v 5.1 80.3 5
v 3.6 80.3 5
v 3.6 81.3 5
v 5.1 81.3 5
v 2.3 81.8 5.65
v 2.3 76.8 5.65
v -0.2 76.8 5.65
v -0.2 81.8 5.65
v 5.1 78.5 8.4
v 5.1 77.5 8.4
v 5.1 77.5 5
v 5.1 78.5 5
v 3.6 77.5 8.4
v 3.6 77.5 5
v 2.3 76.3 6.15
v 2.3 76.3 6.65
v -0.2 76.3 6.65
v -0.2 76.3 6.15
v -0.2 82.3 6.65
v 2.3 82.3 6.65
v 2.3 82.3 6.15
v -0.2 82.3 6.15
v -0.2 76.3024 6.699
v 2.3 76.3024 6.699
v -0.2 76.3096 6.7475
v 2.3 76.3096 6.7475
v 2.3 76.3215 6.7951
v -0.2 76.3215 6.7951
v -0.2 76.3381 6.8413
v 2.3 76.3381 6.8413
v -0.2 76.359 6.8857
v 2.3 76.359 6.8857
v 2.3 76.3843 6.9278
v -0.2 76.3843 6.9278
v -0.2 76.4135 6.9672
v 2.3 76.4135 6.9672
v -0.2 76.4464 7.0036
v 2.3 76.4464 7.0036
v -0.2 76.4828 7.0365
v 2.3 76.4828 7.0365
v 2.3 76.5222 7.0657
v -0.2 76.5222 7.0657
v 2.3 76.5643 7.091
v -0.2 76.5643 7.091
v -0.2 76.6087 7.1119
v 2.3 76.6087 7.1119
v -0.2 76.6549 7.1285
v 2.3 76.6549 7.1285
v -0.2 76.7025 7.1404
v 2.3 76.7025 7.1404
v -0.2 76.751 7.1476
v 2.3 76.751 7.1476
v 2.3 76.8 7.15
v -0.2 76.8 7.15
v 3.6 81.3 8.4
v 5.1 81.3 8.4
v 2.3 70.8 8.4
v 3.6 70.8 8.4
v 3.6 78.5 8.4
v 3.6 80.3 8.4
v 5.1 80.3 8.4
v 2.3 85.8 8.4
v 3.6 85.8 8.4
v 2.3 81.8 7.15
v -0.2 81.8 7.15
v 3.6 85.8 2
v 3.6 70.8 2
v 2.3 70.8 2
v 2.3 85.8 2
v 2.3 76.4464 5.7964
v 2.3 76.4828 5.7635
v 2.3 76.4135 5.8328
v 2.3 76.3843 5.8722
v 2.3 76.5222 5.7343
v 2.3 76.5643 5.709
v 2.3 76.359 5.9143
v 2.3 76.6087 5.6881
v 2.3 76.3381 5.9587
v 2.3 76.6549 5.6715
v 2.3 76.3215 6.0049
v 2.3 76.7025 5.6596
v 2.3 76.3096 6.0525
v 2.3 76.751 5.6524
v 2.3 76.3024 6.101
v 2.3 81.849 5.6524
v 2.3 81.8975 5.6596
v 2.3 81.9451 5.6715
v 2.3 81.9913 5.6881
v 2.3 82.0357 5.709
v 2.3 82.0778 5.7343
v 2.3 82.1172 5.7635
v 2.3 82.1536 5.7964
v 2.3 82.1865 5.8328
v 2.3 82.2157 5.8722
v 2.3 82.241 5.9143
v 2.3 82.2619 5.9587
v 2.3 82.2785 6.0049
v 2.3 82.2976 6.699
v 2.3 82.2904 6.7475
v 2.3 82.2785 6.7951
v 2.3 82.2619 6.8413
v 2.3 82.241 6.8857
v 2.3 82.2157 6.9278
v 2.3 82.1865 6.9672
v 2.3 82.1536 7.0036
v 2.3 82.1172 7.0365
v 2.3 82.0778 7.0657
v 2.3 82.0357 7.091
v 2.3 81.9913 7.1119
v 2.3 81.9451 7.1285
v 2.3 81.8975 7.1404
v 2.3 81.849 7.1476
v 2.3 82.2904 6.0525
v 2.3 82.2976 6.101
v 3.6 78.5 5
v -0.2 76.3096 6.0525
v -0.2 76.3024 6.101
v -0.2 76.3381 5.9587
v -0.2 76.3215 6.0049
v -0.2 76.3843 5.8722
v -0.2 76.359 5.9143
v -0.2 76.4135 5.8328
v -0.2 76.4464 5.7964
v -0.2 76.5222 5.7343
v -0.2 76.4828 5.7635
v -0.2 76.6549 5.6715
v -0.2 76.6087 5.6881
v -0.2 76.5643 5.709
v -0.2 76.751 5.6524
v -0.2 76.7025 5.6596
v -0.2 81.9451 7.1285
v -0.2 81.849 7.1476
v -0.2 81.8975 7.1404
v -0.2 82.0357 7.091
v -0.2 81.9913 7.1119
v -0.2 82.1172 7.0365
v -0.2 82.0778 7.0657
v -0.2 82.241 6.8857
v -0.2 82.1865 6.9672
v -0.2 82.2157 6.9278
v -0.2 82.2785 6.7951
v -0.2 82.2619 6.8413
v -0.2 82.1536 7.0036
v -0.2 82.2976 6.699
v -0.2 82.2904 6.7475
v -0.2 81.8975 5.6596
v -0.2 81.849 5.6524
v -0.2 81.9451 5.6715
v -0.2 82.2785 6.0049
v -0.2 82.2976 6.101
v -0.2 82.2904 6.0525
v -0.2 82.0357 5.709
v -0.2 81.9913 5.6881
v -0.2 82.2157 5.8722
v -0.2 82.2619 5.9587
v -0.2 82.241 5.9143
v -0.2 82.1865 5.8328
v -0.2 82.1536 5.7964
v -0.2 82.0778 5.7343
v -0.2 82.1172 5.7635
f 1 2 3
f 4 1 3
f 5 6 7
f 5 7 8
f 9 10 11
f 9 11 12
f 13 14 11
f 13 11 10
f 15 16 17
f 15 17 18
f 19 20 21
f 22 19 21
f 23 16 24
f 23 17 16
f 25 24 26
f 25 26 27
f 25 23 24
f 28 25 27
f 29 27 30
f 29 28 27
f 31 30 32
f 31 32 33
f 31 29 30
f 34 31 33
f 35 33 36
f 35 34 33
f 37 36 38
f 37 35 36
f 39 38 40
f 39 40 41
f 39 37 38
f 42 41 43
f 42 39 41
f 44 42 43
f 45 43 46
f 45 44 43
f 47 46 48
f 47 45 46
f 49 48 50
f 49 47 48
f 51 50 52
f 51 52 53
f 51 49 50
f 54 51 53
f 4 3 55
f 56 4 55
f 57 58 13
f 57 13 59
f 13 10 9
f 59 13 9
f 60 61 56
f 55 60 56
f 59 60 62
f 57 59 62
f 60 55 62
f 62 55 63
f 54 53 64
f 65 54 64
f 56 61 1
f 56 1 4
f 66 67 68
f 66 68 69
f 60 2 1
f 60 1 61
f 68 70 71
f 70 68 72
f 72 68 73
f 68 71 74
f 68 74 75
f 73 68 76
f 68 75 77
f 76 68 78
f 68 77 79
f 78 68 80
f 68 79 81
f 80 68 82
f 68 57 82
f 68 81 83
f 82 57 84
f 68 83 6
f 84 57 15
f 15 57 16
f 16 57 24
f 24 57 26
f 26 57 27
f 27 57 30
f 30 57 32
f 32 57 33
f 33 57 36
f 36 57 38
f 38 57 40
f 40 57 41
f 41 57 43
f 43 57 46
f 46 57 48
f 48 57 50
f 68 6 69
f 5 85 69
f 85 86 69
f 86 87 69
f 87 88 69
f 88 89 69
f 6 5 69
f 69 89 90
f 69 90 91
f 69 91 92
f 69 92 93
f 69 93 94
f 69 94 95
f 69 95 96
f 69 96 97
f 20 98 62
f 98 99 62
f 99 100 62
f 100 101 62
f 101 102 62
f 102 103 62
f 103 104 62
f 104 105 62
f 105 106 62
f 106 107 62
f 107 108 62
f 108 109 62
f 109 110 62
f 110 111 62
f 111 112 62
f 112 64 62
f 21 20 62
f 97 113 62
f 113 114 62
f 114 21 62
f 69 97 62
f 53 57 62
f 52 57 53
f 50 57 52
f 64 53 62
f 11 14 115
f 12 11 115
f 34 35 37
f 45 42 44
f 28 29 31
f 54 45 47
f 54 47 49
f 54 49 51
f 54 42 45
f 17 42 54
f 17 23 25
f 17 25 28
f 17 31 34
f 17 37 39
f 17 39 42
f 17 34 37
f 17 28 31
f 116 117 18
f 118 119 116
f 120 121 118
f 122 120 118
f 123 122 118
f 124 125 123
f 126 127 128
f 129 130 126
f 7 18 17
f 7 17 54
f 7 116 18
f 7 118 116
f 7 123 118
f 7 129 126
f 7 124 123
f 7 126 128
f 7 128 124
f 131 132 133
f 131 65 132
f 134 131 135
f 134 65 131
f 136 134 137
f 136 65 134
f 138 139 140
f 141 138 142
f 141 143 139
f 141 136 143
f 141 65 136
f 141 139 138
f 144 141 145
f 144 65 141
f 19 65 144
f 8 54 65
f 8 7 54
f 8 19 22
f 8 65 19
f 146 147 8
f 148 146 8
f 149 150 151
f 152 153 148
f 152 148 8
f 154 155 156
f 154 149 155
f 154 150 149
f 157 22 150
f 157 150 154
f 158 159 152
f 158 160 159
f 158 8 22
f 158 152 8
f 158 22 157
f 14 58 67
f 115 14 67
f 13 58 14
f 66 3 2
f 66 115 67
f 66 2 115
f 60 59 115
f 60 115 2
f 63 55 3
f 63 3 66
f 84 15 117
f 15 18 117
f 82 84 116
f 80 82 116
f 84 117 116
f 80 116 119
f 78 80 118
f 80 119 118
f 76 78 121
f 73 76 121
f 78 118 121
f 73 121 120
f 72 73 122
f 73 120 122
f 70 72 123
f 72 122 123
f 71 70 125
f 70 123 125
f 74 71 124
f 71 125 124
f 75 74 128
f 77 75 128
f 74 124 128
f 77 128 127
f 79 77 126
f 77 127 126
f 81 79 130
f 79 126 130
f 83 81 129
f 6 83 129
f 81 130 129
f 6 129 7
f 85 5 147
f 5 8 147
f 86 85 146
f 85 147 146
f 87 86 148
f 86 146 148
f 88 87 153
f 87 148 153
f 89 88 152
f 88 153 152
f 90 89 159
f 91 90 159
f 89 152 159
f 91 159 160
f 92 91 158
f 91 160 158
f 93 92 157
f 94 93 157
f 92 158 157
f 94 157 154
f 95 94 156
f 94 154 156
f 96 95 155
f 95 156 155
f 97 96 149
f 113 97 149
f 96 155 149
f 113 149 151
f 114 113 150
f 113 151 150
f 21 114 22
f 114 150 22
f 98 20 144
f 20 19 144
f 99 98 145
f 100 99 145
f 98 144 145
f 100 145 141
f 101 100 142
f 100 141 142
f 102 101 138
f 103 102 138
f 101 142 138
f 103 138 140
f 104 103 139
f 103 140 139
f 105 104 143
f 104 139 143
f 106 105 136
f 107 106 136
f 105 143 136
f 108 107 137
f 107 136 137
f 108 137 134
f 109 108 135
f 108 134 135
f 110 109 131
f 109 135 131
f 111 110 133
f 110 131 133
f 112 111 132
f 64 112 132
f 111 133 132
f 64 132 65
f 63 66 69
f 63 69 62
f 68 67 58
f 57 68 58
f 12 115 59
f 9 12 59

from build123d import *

# Parameters (mm, degrees)
SKETCH019_W  = 15
SKETCH019_H  = 6.4
PAD010_DEPTH = 1.3
SKETCH020_W  = 6
SKETCH020_H  = 1.5
PAD011_DEPTH = 2.5
SKETCH021_W  = 1
SKETCH021_H  = 3.4
PAD012_DEPTH = 1.5
FILLET_R     = 0.5


with BuildPart() as part:
    # Sketch019 → Pad010 (new body)
    with BuildSketch(Plane.YZ.offset(3.6)):
        with Locations((78.3, 5.2)):
            Rectangle(SKETCH019_W, SKETCH019_H)
    extrude(amount=-PAD010_DEPTH)

    # Sketch020 (on Face6 of Pad010) → Pad011 (join)
    with BuildSketch(Plane(origin=(2.3, 0, 0), x_dir=(0, 1, 0), z_dir=(-1, 0, 0))):
        with Locations((79.3, -6.4)):
            Rectangle(SKETCH020_W, SKETCH020_H)
    extrude(amount=PAD011_DEPTH)

    # Sketch021 (on Face4 of Pad011) → Pad012 (join)
    with BuildSketch(Plane.YZ.offset(3.6)):
        with Locations((78, 6.7)):
            Rectangle(SKETCH021_W, SKETCH021_H)
        with Locations((80.8, 6.7)):
            Rectangle(SKETCH021_W, SKETCH021_H)
    extrude(amount=PAD012_DEPTH)

    # Fillet
    fillet_edges = [part.edges().sort_by_distance(p)[0] for p in [
        (1.05, 76.3, 7.15),
        (1.05, 76.3, 5.65),
        (1.05, 82.3, 5.65),
        (1.05, 82.3, 7.15),
    ]]
    fillet(fillet_edges, radius=FILLET_R)


solid = part.part
